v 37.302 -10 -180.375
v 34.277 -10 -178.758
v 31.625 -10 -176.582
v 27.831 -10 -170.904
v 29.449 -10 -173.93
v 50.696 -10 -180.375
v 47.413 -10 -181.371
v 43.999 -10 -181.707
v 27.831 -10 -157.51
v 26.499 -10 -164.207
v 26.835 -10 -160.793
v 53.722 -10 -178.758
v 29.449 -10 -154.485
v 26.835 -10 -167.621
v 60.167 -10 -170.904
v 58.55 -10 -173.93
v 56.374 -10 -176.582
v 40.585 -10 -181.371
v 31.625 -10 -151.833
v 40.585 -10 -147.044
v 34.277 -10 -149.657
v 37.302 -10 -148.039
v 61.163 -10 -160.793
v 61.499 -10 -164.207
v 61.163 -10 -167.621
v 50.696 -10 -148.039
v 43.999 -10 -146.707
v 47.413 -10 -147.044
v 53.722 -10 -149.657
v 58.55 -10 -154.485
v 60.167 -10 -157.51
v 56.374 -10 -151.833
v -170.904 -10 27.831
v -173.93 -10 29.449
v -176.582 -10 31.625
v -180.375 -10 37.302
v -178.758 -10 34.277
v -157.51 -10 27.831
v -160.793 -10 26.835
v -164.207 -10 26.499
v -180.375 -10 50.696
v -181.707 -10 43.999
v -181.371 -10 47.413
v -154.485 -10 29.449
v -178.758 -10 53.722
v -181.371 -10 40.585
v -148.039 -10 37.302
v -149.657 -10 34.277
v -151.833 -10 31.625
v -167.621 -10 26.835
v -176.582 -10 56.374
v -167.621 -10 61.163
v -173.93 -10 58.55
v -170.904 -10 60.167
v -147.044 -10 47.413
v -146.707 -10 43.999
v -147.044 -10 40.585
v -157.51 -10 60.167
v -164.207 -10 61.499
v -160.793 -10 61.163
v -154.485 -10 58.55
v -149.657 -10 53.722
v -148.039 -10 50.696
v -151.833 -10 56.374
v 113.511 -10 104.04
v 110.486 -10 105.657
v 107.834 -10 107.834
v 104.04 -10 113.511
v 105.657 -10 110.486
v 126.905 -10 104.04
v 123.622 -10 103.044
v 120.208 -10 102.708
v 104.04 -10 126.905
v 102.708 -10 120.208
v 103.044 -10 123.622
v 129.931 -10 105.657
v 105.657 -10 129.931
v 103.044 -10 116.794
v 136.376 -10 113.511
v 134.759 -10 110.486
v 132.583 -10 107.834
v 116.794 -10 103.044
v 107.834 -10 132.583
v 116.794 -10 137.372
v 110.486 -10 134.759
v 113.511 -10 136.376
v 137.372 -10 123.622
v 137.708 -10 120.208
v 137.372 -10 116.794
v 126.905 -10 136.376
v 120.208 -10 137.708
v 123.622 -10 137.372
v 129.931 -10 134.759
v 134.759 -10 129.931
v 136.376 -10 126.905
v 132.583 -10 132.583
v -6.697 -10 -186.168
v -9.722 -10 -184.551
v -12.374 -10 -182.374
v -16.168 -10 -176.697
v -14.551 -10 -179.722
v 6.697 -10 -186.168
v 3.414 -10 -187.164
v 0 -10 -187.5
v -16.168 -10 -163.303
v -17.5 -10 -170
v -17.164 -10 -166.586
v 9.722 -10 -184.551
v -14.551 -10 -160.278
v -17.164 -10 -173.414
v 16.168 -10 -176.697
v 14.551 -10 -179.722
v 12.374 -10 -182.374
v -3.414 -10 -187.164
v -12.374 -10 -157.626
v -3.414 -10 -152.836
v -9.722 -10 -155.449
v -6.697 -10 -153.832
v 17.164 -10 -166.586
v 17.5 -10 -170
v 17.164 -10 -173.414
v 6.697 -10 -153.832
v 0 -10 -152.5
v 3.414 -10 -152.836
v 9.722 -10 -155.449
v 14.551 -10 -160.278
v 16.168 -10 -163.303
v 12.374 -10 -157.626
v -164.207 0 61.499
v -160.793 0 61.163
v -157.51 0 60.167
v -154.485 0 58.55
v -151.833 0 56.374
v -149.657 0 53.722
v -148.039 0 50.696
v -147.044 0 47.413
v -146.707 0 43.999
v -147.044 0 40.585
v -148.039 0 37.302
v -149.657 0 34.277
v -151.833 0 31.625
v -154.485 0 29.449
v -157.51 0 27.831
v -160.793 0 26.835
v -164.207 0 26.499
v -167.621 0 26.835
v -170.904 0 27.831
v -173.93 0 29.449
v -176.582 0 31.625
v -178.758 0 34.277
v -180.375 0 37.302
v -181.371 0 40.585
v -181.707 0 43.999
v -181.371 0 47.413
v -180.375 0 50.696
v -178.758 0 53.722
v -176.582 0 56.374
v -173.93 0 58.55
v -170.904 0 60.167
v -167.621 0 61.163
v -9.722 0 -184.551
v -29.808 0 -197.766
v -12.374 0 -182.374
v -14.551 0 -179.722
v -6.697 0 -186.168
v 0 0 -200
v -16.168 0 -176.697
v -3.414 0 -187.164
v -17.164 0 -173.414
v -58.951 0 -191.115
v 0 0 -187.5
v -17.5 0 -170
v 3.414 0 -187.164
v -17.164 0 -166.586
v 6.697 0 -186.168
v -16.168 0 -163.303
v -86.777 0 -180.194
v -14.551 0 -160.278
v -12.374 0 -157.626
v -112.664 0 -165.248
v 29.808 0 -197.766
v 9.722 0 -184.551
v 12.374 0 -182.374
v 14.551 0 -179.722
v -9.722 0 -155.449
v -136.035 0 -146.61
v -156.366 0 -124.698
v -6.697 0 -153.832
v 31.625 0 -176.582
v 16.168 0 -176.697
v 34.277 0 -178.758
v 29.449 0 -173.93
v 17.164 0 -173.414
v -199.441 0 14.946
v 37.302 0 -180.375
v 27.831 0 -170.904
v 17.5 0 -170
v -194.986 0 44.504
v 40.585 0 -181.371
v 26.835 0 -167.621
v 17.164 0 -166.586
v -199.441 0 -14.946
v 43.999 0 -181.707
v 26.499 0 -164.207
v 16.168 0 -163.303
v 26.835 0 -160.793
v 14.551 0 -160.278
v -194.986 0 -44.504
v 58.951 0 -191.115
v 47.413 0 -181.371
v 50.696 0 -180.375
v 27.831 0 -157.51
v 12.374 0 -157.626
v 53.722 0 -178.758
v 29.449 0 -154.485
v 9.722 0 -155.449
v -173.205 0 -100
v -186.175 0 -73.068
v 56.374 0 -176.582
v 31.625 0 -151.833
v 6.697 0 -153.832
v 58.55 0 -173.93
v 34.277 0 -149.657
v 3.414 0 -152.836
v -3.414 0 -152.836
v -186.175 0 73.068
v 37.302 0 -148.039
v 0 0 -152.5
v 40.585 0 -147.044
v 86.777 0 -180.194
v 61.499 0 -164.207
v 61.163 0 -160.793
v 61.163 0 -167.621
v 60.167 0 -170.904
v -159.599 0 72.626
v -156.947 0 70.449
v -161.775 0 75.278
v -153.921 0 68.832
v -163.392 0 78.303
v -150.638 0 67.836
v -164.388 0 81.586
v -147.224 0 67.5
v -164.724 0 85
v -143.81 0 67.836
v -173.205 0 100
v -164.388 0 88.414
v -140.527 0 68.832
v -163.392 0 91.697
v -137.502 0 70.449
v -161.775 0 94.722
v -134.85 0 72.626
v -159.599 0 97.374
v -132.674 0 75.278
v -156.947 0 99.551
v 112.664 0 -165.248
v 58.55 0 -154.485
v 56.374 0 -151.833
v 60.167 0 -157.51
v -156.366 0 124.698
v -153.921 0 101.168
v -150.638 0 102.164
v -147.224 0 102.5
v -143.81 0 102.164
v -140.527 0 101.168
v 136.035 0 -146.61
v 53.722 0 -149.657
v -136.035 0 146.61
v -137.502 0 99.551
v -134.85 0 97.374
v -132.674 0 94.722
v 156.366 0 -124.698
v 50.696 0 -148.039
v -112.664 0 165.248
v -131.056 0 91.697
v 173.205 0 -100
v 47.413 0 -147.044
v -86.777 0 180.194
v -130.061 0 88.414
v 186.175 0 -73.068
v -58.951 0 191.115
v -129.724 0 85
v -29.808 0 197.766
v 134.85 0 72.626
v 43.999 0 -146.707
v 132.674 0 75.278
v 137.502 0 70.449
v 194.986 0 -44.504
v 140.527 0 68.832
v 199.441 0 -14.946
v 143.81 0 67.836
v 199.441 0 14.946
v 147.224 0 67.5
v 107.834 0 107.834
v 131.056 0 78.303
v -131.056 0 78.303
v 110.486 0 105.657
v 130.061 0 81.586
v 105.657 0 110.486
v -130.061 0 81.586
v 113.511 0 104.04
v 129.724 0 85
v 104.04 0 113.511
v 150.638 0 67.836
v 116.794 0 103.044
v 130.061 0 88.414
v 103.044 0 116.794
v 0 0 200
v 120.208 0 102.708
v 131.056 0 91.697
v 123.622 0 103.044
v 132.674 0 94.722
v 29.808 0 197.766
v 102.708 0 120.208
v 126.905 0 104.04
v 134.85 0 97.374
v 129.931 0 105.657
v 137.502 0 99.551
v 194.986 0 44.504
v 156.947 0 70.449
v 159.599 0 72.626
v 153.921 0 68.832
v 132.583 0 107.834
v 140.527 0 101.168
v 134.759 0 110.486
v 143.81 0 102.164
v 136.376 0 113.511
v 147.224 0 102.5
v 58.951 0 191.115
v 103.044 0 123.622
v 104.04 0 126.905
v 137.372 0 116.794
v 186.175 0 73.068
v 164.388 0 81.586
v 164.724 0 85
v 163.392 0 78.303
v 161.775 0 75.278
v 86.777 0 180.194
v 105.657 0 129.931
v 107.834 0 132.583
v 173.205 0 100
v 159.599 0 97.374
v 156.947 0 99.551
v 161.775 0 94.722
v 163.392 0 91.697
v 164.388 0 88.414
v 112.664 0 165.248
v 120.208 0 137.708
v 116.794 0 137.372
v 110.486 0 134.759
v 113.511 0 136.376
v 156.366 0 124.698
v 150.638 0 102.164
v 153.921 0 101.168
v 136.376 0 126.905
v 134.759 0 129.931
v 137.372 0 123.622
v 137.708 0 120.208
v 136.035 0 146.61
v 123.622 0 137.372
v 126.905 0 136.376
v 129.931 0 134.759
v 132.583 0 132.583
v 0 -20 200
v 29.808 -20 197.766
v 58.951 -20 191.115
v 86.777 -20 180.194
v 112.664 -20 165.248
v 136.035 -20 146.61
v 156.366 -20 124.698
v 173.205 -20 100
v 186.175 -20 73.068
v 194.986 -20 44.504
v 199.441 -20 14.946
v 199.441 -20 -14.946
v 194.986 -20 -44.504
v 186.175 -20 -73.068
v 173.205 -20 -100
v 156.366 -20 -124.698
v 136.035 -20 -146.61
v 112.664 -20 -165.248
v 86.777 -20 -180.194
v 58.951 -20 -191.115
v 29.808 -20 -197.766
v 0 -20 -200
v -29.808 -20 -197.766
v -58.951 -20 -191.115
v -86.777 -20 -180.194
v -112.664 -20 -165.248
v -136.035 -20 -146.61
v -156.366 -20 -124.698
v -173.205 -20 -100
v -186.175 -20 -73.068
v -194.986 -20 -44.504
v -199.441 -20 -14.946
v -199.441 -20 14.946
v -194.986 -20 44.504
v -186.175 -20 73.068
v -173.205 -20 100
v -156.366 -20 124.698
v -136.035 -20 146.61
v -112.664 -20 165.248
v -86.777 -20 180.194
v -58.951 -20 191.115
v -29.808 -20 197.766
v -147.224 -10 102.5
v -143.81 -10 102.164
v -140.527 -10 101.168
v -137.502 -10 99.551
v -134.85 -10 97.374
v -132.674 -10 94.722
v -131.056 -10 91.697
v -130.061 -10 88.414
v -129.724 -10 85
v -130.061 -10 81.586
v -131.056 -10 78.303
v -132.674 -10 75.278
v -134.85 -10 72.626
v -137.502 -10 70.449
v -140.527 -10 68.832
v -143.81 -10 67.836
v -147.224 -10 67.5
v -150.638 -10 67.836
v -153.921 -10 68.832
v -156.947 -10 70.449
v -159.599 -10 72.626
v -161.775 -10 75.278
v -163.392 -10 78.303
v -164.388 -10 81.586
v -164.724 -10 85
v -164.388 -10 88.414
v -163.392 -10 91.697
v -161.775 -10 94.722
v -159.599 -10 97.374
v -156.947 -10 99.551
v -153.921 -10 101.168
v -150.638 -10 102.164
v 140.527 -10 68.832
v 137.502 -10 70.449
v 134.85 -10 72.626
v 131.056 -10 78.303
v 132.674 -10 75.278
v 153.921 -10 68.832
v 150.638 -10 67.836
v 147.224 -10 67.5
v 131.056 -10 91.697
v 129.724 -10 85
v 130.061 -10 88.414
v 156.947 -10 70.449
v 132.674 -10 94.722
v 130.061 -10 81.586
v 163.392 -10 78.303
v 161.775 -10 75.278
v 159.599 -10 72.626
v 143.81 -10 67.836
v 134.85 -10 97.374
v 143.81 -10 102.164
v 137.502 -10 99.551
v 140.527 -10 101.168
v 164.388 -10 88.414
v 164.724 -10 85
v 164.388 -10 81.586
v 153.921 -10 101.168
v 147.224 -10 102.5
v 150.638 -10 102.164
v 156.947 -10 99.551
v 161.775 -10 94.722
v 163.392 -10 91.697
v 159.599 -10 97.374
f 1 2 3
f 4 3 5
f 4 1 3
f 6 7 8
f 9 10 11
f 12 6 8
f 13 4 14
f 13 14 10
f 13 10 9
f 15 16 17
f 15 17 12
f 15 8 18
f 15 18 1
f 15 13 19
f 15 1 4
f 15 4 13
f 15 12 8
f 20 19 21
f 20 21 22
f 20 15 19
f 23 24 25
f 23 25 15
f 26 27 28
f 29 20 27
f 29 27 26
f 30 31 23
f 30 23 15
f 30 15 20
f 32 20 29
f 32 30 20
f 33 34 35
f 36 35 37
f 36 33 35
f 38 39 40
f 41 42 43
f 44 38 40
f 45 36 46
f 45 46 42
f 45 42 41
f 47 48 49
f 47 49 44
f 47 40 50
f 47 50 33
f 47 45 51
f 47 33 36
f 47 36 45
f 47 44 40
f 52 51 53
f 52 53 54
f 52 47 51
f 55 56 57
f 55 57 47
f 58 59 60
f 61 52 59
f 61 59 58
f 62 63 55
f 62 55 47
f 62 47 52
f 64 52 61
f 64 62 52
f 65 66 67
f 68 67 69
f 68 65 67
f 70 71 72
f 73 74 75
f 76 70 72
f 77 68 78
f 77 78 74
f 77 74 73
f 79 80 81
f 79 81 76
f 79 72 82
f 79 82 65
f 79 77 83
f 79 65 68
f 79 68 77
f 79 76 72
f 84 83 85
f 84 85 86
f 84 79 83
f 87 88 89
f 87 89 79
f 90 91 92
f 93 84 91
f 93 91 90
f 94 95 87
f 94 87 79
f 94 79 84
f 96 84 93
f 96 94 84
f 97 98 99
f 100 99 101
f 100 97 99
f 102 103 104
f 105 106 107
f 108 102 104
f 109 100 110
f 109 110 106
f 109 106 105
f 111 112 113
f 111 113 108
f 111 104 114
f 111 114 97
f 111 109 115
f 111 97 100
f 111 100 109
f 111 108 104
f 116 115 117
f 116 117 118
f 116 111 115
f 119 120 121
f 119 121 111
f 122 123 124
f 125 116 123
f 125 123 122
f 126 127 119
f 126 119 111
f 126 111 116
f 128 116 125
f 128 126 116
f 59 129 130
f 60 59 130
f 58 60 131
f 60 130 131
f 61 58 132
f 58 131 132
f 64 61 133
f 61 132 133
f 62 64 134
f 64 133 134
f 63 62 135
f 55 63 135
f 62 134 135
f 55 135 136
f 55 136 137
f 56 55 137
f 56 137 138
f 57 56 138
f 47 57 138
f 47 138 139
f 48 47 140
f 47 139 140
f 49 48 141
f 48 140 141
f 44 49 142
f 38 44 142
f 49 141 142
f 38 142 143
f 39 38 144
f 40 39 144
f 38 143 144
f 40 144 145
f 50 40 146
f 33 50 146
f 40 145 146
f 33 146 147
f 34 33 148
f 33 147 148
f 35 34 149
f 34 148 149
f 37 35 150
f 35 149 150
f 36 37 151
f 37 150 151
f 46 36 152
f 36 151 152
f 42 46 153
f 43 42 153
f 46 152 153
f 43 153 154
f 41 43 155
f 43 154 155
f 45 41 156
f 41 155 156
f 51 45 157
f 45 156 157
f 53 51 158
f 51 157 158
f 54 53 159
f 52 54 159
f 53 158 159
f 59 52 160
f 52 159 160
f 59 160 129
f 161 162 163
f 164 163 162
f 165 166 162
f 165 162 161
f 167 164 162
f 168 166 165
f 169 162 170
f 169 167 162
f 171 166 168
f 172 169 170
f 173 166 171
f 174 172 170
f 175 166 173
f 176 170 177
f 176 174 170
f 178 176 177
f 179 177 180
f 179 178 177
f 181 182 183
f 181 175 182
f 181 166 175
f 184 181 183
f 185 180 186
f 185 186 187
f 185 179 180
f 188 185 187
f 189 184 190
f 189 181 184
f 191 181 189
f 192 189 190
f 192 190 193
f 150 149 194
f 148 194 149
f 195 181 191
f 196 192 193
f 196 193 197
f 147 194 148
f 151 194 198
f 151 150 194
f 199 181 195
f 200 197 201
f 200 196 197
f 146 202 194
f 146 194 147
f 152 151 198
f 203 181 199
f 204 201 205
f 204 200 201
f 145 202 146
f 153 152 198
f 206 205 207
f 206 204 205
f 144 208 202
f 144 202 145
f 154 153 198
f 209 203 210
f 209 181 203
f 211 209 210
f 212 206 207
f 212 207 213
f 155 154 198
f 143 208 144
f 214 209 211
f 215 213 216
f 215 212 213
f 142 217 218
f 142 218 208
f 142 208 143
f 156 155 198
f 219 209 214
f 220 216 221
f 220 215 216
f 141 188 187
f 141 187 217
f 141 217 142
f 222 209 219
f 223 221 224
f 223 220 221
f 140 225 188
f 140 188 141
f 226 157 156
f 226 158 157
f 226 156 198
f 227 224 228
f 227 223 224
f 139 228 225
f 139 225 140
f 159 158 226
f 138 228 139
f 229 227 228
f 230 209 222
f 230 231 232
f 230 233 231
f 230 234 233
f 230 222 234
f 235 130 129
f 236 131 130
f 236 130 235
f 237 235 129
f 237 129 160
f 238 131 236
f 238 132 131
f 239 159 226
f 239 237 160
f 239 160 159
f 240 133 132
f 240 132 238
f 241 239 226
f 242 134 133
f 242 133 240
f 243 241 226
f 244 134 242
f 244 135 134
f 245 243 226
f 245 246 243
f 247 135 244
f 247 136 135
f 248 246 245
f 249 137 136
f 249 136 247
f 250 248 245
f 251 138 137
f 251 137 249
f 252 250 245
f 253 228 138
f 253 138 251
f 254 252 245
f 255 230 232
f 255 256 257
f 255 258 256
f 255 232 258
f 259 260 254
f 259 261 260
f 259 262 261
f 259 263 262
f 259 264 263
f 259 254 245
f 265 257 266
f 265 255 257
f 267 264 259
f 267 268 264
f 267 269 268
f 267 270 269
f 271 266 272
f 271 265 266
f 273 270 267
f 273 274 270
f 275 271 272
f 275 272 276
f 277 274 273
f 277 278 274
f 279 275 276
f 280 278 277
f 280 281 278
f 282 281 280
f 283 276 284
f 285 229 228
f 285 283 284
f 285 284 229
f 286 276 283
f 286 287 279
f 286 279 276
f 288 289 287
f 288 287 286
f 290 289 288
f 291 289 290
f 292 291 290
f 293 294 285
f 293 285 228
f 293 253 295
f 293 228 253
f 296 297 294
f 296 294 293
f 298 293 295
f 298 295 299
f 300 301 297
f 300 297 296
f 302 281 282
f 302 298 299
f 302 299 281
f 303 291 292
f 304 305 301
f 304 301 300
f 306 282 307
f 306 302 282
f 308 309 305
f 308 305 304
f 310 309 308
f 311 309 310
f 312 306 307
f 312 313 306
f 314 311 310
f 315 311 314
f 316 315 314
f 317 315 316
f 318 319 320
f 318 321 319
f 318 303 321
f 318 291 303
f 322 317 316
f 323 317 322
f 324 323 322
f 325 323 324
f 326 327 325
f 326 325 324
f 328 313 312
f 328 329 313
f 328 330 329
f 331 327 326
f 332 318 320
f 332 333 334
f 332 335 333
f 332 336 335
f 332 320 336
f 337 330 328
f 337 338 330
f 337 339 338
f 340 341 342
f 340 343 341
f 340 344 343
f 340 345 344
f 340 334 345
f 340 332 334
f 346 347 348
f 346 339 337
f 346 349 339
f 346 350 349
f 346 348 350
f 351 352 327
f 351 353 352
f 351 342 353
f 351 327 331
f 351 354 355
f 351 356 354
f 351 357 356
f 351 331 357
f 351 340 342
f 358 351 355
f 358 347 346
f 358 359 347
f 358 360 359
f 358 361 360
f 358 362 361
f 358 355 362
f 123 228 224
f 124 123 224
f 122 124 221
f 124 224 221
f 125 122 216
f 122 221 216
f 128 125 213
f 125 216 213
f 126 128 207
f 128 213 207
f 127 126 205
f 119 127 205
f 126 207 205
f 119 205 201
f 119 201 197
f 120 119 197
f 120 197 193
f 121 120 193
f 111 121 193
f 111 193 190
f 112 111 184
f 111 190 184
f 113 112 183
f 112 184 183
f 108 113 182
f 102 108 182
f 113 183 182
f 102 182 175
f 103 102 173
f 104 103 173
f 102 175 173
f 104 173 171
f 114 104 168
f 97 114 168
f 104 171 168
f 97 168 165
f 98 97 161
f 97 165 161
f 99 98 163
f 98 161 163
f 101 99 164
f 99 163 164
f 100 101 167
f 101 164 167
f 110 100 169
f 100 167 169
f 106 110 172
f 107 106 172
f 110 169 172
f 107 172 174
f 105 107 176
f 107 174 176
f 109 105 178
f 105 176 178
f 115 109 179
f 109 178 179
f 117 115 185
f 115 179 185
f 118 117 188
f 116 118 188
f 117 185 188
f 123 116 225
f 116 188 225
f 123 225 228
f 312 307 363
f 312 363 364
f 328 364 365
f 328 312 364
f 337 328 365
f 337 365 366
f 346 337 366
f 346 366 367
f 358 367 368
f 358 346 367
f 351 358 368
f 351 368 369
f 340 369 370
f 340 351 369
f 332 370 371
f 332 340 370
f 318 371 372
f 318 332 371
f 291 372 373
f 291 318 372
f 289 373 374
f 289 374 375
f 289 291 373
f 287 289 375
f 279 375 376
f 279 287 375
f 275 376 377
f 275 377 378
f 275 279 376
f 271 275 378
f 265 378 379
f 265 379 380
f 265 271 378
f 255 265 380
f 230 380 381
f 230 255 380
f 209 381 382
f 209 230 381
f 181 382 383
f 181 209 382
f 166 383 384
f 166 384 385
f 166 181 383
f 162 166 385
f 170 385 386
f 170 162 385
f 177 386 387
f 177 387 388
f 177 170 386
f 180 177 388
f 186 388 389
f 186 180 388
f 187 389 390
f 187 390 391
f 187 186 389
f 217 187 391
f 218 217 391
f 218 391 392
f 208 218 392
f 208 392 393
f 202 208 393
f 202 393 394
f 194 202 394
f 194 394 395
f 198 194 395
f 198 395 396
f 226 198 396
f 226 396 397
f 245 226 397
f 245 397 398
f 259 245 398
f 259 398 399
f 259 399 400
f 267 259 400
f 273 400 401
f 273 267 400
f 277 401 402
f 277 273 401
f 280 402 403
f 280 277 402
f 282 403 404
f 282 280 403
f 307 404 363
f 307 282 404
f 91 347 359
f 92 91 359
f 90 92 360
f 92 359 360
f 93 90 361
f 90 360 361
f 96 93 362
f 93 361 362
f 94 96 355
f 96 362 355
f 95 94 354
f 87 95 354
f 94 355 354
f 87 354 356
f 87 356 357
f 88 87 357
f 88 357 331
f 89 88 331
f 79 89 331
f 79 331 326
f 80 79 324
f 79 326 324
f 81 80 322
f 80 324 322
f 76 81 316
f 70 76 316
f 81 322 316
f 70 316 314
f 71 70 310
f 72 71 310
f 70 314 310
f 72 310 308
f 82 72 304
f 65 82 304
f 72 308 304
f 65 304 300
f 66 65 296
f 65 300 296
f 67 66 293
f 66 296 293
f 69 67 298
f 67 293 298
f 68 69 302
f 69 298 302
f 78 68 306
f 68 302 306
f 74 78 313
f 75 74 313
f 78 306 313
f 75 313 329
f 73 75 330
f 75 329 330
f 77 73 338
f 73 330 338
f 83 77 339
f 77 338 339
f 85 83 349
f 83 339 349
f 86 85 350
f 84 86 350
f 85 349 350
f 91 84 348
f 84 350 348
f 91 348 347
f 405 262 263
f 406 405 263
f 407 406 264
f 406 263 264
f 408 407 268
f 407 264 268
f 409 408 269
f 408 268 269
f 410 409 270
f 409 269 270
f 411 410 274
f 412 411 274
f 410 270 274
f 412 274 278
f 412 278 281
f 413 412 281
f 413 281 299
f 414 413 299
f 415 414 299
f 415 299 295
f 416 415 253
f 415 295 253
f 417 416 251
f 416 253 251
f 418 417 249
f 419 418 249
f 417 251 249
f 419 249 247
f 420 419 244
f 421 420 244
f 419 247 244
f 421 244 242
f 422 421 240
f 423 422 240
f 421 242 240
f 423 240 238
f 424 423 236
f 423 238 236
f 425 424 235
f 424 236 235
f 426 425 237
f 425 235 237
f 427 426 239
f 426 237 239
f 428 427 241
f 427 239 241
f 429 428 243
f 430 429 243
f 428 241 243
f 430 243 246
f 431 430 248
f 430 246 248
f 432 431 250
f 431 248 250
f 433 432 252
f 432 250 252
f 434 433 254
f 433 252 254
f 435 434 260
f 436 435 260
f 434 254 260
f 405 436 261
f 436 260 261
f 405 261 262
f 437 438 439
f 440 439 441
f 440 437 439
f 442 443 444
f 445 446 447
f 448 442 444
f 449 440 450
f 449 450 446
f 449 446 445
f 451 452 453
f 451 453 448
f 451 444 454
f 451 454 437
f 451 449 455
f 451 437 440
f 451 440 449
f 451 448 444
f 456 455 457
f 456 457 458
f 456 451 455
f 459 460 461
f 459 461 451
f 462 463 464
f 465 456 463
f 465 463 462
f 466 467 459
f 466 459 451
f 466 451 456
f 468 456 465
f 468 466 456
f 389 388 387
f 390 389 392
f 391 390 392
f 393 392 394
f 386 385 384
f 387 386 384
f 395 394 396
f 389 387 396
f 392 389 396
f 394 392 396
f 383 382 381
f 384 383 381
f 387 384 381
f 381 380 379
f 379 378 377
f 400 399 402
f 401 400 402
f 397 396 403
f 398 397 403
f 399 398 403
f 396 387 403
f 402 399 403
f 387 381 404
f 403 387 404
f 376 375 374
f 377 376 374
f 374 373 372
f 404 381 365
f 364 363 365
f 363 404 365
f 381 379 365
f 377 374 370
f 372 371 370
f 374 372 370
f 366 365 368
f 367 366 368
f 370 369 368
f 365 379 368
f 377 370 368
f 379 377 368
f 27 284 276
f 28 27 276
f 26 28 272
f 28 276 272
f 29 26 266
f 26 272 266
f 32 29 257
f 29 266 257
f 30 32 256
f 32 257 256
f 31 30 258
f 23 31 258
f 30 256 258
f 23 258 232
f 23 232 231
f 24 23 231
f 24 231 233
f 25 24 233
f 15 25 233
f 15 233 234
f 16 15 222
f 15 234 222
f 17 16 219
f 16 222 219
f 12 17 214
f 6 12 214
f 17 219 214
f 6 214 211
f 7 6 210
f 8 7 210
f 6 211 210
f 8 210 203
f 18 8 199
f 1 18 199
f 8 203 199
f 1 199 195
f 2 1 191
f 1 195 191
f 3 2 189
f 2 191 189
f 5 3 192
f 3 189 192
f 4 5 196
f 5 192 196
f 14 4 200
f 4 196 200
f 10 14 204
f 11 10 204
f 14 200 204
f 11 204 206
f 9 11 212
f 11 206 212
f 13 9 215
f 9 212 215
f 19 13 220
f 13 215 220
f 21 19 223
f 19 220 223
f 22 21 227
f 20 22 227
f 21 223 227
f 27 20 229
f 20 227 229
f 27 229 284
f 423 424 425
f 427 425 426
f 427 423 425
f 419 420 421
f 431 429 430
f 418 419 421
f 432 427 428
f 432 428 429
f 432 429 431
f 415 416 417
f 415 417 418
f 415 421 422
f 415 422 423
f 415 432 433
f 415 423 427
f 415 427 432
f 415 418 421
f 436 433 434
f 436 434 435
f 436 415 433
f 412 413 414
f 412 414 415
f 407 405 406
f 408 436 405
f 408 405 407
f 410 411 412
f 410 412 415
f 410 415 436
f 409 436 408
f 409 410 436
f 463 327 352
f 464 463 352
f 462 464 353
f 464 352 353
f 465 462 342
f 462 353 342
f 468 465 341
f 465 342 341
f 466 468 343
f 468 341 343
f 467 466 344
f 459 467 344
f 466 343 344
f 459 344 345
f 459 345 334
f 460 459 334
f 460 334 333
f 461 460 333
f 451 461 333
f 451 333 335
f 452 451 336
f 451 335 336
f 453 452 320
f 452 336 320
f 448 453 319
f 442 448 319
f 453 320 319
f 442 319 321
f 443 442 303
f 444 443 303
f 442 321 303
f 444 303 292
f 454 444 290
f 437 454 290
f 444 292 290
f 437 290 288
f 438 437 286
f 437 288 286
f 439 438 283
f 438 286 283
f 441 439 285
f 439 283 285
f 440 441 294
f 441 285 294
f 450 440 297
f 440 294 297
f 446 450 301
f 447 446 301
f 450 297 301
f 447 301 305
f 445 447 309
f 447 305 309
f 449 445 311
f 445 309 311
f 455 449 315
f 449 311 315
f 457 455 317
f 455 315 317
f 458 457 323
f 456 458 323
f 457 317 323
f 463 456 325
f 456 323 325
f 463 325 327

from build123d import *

# Parameters (mm, degrees)
SKETCH1_R          = 200
EXTRUDE1_DEPTH     = 20
SKETCH2_R          = 17.5
CUT_EXTRUDE1_DEPTH = 10


with BuildPart() as part:
    # Sketch1 → Extrude1 (new body)
    with BuildSketch(Plane(origin=(0, 0, 0), x_dir=(1, 0, 0), z_dir=(0, 1, 0))):
        with Locations(Location((0, 0, 0), (0, 0, 270))):
            Circle(SKETCH1_R)
    extrude(amount=-EXTRUDE1_DEPTH)

    # Sketch2 → Cut-Extrude1 (cut)
    with BuildSketch(Plane(origin=(0, 0, 0), x_dir=(1, 0, 0), z_dir=(0, 1, 0))):
        with Locations(Location((0, 170, 0), (0, 0, 270))):
            Circle(SKETCH2_R)
        with Locations(Location((43.999237667, 164.207390469, 0), (0, 0, 270))):
            Circle(SKETCH2_R)
        with Locations(Location((147.224318643, -85, 0), (0, 0, 270))):
            Circle(SKETCH2_R)
        with Locations(Location((120.208152802, -120.208152802, 0), (0, 0, 270))):
            Circle(SKETCH2_R)
        with Locations(Location((-147.224318643, -85, 0), (0, 0, 270))):
            Circle(SKETCH2_R)
        with Locations(Location((-164.207390469, -43.999237667, 0), (0, 0, 270))):
            Circle(SKETCH2_R)
    extrude(amount=-CUT_EXTRUDE1_DEPTH, mode=Mode.SUBTRACT)


solid = part.part
